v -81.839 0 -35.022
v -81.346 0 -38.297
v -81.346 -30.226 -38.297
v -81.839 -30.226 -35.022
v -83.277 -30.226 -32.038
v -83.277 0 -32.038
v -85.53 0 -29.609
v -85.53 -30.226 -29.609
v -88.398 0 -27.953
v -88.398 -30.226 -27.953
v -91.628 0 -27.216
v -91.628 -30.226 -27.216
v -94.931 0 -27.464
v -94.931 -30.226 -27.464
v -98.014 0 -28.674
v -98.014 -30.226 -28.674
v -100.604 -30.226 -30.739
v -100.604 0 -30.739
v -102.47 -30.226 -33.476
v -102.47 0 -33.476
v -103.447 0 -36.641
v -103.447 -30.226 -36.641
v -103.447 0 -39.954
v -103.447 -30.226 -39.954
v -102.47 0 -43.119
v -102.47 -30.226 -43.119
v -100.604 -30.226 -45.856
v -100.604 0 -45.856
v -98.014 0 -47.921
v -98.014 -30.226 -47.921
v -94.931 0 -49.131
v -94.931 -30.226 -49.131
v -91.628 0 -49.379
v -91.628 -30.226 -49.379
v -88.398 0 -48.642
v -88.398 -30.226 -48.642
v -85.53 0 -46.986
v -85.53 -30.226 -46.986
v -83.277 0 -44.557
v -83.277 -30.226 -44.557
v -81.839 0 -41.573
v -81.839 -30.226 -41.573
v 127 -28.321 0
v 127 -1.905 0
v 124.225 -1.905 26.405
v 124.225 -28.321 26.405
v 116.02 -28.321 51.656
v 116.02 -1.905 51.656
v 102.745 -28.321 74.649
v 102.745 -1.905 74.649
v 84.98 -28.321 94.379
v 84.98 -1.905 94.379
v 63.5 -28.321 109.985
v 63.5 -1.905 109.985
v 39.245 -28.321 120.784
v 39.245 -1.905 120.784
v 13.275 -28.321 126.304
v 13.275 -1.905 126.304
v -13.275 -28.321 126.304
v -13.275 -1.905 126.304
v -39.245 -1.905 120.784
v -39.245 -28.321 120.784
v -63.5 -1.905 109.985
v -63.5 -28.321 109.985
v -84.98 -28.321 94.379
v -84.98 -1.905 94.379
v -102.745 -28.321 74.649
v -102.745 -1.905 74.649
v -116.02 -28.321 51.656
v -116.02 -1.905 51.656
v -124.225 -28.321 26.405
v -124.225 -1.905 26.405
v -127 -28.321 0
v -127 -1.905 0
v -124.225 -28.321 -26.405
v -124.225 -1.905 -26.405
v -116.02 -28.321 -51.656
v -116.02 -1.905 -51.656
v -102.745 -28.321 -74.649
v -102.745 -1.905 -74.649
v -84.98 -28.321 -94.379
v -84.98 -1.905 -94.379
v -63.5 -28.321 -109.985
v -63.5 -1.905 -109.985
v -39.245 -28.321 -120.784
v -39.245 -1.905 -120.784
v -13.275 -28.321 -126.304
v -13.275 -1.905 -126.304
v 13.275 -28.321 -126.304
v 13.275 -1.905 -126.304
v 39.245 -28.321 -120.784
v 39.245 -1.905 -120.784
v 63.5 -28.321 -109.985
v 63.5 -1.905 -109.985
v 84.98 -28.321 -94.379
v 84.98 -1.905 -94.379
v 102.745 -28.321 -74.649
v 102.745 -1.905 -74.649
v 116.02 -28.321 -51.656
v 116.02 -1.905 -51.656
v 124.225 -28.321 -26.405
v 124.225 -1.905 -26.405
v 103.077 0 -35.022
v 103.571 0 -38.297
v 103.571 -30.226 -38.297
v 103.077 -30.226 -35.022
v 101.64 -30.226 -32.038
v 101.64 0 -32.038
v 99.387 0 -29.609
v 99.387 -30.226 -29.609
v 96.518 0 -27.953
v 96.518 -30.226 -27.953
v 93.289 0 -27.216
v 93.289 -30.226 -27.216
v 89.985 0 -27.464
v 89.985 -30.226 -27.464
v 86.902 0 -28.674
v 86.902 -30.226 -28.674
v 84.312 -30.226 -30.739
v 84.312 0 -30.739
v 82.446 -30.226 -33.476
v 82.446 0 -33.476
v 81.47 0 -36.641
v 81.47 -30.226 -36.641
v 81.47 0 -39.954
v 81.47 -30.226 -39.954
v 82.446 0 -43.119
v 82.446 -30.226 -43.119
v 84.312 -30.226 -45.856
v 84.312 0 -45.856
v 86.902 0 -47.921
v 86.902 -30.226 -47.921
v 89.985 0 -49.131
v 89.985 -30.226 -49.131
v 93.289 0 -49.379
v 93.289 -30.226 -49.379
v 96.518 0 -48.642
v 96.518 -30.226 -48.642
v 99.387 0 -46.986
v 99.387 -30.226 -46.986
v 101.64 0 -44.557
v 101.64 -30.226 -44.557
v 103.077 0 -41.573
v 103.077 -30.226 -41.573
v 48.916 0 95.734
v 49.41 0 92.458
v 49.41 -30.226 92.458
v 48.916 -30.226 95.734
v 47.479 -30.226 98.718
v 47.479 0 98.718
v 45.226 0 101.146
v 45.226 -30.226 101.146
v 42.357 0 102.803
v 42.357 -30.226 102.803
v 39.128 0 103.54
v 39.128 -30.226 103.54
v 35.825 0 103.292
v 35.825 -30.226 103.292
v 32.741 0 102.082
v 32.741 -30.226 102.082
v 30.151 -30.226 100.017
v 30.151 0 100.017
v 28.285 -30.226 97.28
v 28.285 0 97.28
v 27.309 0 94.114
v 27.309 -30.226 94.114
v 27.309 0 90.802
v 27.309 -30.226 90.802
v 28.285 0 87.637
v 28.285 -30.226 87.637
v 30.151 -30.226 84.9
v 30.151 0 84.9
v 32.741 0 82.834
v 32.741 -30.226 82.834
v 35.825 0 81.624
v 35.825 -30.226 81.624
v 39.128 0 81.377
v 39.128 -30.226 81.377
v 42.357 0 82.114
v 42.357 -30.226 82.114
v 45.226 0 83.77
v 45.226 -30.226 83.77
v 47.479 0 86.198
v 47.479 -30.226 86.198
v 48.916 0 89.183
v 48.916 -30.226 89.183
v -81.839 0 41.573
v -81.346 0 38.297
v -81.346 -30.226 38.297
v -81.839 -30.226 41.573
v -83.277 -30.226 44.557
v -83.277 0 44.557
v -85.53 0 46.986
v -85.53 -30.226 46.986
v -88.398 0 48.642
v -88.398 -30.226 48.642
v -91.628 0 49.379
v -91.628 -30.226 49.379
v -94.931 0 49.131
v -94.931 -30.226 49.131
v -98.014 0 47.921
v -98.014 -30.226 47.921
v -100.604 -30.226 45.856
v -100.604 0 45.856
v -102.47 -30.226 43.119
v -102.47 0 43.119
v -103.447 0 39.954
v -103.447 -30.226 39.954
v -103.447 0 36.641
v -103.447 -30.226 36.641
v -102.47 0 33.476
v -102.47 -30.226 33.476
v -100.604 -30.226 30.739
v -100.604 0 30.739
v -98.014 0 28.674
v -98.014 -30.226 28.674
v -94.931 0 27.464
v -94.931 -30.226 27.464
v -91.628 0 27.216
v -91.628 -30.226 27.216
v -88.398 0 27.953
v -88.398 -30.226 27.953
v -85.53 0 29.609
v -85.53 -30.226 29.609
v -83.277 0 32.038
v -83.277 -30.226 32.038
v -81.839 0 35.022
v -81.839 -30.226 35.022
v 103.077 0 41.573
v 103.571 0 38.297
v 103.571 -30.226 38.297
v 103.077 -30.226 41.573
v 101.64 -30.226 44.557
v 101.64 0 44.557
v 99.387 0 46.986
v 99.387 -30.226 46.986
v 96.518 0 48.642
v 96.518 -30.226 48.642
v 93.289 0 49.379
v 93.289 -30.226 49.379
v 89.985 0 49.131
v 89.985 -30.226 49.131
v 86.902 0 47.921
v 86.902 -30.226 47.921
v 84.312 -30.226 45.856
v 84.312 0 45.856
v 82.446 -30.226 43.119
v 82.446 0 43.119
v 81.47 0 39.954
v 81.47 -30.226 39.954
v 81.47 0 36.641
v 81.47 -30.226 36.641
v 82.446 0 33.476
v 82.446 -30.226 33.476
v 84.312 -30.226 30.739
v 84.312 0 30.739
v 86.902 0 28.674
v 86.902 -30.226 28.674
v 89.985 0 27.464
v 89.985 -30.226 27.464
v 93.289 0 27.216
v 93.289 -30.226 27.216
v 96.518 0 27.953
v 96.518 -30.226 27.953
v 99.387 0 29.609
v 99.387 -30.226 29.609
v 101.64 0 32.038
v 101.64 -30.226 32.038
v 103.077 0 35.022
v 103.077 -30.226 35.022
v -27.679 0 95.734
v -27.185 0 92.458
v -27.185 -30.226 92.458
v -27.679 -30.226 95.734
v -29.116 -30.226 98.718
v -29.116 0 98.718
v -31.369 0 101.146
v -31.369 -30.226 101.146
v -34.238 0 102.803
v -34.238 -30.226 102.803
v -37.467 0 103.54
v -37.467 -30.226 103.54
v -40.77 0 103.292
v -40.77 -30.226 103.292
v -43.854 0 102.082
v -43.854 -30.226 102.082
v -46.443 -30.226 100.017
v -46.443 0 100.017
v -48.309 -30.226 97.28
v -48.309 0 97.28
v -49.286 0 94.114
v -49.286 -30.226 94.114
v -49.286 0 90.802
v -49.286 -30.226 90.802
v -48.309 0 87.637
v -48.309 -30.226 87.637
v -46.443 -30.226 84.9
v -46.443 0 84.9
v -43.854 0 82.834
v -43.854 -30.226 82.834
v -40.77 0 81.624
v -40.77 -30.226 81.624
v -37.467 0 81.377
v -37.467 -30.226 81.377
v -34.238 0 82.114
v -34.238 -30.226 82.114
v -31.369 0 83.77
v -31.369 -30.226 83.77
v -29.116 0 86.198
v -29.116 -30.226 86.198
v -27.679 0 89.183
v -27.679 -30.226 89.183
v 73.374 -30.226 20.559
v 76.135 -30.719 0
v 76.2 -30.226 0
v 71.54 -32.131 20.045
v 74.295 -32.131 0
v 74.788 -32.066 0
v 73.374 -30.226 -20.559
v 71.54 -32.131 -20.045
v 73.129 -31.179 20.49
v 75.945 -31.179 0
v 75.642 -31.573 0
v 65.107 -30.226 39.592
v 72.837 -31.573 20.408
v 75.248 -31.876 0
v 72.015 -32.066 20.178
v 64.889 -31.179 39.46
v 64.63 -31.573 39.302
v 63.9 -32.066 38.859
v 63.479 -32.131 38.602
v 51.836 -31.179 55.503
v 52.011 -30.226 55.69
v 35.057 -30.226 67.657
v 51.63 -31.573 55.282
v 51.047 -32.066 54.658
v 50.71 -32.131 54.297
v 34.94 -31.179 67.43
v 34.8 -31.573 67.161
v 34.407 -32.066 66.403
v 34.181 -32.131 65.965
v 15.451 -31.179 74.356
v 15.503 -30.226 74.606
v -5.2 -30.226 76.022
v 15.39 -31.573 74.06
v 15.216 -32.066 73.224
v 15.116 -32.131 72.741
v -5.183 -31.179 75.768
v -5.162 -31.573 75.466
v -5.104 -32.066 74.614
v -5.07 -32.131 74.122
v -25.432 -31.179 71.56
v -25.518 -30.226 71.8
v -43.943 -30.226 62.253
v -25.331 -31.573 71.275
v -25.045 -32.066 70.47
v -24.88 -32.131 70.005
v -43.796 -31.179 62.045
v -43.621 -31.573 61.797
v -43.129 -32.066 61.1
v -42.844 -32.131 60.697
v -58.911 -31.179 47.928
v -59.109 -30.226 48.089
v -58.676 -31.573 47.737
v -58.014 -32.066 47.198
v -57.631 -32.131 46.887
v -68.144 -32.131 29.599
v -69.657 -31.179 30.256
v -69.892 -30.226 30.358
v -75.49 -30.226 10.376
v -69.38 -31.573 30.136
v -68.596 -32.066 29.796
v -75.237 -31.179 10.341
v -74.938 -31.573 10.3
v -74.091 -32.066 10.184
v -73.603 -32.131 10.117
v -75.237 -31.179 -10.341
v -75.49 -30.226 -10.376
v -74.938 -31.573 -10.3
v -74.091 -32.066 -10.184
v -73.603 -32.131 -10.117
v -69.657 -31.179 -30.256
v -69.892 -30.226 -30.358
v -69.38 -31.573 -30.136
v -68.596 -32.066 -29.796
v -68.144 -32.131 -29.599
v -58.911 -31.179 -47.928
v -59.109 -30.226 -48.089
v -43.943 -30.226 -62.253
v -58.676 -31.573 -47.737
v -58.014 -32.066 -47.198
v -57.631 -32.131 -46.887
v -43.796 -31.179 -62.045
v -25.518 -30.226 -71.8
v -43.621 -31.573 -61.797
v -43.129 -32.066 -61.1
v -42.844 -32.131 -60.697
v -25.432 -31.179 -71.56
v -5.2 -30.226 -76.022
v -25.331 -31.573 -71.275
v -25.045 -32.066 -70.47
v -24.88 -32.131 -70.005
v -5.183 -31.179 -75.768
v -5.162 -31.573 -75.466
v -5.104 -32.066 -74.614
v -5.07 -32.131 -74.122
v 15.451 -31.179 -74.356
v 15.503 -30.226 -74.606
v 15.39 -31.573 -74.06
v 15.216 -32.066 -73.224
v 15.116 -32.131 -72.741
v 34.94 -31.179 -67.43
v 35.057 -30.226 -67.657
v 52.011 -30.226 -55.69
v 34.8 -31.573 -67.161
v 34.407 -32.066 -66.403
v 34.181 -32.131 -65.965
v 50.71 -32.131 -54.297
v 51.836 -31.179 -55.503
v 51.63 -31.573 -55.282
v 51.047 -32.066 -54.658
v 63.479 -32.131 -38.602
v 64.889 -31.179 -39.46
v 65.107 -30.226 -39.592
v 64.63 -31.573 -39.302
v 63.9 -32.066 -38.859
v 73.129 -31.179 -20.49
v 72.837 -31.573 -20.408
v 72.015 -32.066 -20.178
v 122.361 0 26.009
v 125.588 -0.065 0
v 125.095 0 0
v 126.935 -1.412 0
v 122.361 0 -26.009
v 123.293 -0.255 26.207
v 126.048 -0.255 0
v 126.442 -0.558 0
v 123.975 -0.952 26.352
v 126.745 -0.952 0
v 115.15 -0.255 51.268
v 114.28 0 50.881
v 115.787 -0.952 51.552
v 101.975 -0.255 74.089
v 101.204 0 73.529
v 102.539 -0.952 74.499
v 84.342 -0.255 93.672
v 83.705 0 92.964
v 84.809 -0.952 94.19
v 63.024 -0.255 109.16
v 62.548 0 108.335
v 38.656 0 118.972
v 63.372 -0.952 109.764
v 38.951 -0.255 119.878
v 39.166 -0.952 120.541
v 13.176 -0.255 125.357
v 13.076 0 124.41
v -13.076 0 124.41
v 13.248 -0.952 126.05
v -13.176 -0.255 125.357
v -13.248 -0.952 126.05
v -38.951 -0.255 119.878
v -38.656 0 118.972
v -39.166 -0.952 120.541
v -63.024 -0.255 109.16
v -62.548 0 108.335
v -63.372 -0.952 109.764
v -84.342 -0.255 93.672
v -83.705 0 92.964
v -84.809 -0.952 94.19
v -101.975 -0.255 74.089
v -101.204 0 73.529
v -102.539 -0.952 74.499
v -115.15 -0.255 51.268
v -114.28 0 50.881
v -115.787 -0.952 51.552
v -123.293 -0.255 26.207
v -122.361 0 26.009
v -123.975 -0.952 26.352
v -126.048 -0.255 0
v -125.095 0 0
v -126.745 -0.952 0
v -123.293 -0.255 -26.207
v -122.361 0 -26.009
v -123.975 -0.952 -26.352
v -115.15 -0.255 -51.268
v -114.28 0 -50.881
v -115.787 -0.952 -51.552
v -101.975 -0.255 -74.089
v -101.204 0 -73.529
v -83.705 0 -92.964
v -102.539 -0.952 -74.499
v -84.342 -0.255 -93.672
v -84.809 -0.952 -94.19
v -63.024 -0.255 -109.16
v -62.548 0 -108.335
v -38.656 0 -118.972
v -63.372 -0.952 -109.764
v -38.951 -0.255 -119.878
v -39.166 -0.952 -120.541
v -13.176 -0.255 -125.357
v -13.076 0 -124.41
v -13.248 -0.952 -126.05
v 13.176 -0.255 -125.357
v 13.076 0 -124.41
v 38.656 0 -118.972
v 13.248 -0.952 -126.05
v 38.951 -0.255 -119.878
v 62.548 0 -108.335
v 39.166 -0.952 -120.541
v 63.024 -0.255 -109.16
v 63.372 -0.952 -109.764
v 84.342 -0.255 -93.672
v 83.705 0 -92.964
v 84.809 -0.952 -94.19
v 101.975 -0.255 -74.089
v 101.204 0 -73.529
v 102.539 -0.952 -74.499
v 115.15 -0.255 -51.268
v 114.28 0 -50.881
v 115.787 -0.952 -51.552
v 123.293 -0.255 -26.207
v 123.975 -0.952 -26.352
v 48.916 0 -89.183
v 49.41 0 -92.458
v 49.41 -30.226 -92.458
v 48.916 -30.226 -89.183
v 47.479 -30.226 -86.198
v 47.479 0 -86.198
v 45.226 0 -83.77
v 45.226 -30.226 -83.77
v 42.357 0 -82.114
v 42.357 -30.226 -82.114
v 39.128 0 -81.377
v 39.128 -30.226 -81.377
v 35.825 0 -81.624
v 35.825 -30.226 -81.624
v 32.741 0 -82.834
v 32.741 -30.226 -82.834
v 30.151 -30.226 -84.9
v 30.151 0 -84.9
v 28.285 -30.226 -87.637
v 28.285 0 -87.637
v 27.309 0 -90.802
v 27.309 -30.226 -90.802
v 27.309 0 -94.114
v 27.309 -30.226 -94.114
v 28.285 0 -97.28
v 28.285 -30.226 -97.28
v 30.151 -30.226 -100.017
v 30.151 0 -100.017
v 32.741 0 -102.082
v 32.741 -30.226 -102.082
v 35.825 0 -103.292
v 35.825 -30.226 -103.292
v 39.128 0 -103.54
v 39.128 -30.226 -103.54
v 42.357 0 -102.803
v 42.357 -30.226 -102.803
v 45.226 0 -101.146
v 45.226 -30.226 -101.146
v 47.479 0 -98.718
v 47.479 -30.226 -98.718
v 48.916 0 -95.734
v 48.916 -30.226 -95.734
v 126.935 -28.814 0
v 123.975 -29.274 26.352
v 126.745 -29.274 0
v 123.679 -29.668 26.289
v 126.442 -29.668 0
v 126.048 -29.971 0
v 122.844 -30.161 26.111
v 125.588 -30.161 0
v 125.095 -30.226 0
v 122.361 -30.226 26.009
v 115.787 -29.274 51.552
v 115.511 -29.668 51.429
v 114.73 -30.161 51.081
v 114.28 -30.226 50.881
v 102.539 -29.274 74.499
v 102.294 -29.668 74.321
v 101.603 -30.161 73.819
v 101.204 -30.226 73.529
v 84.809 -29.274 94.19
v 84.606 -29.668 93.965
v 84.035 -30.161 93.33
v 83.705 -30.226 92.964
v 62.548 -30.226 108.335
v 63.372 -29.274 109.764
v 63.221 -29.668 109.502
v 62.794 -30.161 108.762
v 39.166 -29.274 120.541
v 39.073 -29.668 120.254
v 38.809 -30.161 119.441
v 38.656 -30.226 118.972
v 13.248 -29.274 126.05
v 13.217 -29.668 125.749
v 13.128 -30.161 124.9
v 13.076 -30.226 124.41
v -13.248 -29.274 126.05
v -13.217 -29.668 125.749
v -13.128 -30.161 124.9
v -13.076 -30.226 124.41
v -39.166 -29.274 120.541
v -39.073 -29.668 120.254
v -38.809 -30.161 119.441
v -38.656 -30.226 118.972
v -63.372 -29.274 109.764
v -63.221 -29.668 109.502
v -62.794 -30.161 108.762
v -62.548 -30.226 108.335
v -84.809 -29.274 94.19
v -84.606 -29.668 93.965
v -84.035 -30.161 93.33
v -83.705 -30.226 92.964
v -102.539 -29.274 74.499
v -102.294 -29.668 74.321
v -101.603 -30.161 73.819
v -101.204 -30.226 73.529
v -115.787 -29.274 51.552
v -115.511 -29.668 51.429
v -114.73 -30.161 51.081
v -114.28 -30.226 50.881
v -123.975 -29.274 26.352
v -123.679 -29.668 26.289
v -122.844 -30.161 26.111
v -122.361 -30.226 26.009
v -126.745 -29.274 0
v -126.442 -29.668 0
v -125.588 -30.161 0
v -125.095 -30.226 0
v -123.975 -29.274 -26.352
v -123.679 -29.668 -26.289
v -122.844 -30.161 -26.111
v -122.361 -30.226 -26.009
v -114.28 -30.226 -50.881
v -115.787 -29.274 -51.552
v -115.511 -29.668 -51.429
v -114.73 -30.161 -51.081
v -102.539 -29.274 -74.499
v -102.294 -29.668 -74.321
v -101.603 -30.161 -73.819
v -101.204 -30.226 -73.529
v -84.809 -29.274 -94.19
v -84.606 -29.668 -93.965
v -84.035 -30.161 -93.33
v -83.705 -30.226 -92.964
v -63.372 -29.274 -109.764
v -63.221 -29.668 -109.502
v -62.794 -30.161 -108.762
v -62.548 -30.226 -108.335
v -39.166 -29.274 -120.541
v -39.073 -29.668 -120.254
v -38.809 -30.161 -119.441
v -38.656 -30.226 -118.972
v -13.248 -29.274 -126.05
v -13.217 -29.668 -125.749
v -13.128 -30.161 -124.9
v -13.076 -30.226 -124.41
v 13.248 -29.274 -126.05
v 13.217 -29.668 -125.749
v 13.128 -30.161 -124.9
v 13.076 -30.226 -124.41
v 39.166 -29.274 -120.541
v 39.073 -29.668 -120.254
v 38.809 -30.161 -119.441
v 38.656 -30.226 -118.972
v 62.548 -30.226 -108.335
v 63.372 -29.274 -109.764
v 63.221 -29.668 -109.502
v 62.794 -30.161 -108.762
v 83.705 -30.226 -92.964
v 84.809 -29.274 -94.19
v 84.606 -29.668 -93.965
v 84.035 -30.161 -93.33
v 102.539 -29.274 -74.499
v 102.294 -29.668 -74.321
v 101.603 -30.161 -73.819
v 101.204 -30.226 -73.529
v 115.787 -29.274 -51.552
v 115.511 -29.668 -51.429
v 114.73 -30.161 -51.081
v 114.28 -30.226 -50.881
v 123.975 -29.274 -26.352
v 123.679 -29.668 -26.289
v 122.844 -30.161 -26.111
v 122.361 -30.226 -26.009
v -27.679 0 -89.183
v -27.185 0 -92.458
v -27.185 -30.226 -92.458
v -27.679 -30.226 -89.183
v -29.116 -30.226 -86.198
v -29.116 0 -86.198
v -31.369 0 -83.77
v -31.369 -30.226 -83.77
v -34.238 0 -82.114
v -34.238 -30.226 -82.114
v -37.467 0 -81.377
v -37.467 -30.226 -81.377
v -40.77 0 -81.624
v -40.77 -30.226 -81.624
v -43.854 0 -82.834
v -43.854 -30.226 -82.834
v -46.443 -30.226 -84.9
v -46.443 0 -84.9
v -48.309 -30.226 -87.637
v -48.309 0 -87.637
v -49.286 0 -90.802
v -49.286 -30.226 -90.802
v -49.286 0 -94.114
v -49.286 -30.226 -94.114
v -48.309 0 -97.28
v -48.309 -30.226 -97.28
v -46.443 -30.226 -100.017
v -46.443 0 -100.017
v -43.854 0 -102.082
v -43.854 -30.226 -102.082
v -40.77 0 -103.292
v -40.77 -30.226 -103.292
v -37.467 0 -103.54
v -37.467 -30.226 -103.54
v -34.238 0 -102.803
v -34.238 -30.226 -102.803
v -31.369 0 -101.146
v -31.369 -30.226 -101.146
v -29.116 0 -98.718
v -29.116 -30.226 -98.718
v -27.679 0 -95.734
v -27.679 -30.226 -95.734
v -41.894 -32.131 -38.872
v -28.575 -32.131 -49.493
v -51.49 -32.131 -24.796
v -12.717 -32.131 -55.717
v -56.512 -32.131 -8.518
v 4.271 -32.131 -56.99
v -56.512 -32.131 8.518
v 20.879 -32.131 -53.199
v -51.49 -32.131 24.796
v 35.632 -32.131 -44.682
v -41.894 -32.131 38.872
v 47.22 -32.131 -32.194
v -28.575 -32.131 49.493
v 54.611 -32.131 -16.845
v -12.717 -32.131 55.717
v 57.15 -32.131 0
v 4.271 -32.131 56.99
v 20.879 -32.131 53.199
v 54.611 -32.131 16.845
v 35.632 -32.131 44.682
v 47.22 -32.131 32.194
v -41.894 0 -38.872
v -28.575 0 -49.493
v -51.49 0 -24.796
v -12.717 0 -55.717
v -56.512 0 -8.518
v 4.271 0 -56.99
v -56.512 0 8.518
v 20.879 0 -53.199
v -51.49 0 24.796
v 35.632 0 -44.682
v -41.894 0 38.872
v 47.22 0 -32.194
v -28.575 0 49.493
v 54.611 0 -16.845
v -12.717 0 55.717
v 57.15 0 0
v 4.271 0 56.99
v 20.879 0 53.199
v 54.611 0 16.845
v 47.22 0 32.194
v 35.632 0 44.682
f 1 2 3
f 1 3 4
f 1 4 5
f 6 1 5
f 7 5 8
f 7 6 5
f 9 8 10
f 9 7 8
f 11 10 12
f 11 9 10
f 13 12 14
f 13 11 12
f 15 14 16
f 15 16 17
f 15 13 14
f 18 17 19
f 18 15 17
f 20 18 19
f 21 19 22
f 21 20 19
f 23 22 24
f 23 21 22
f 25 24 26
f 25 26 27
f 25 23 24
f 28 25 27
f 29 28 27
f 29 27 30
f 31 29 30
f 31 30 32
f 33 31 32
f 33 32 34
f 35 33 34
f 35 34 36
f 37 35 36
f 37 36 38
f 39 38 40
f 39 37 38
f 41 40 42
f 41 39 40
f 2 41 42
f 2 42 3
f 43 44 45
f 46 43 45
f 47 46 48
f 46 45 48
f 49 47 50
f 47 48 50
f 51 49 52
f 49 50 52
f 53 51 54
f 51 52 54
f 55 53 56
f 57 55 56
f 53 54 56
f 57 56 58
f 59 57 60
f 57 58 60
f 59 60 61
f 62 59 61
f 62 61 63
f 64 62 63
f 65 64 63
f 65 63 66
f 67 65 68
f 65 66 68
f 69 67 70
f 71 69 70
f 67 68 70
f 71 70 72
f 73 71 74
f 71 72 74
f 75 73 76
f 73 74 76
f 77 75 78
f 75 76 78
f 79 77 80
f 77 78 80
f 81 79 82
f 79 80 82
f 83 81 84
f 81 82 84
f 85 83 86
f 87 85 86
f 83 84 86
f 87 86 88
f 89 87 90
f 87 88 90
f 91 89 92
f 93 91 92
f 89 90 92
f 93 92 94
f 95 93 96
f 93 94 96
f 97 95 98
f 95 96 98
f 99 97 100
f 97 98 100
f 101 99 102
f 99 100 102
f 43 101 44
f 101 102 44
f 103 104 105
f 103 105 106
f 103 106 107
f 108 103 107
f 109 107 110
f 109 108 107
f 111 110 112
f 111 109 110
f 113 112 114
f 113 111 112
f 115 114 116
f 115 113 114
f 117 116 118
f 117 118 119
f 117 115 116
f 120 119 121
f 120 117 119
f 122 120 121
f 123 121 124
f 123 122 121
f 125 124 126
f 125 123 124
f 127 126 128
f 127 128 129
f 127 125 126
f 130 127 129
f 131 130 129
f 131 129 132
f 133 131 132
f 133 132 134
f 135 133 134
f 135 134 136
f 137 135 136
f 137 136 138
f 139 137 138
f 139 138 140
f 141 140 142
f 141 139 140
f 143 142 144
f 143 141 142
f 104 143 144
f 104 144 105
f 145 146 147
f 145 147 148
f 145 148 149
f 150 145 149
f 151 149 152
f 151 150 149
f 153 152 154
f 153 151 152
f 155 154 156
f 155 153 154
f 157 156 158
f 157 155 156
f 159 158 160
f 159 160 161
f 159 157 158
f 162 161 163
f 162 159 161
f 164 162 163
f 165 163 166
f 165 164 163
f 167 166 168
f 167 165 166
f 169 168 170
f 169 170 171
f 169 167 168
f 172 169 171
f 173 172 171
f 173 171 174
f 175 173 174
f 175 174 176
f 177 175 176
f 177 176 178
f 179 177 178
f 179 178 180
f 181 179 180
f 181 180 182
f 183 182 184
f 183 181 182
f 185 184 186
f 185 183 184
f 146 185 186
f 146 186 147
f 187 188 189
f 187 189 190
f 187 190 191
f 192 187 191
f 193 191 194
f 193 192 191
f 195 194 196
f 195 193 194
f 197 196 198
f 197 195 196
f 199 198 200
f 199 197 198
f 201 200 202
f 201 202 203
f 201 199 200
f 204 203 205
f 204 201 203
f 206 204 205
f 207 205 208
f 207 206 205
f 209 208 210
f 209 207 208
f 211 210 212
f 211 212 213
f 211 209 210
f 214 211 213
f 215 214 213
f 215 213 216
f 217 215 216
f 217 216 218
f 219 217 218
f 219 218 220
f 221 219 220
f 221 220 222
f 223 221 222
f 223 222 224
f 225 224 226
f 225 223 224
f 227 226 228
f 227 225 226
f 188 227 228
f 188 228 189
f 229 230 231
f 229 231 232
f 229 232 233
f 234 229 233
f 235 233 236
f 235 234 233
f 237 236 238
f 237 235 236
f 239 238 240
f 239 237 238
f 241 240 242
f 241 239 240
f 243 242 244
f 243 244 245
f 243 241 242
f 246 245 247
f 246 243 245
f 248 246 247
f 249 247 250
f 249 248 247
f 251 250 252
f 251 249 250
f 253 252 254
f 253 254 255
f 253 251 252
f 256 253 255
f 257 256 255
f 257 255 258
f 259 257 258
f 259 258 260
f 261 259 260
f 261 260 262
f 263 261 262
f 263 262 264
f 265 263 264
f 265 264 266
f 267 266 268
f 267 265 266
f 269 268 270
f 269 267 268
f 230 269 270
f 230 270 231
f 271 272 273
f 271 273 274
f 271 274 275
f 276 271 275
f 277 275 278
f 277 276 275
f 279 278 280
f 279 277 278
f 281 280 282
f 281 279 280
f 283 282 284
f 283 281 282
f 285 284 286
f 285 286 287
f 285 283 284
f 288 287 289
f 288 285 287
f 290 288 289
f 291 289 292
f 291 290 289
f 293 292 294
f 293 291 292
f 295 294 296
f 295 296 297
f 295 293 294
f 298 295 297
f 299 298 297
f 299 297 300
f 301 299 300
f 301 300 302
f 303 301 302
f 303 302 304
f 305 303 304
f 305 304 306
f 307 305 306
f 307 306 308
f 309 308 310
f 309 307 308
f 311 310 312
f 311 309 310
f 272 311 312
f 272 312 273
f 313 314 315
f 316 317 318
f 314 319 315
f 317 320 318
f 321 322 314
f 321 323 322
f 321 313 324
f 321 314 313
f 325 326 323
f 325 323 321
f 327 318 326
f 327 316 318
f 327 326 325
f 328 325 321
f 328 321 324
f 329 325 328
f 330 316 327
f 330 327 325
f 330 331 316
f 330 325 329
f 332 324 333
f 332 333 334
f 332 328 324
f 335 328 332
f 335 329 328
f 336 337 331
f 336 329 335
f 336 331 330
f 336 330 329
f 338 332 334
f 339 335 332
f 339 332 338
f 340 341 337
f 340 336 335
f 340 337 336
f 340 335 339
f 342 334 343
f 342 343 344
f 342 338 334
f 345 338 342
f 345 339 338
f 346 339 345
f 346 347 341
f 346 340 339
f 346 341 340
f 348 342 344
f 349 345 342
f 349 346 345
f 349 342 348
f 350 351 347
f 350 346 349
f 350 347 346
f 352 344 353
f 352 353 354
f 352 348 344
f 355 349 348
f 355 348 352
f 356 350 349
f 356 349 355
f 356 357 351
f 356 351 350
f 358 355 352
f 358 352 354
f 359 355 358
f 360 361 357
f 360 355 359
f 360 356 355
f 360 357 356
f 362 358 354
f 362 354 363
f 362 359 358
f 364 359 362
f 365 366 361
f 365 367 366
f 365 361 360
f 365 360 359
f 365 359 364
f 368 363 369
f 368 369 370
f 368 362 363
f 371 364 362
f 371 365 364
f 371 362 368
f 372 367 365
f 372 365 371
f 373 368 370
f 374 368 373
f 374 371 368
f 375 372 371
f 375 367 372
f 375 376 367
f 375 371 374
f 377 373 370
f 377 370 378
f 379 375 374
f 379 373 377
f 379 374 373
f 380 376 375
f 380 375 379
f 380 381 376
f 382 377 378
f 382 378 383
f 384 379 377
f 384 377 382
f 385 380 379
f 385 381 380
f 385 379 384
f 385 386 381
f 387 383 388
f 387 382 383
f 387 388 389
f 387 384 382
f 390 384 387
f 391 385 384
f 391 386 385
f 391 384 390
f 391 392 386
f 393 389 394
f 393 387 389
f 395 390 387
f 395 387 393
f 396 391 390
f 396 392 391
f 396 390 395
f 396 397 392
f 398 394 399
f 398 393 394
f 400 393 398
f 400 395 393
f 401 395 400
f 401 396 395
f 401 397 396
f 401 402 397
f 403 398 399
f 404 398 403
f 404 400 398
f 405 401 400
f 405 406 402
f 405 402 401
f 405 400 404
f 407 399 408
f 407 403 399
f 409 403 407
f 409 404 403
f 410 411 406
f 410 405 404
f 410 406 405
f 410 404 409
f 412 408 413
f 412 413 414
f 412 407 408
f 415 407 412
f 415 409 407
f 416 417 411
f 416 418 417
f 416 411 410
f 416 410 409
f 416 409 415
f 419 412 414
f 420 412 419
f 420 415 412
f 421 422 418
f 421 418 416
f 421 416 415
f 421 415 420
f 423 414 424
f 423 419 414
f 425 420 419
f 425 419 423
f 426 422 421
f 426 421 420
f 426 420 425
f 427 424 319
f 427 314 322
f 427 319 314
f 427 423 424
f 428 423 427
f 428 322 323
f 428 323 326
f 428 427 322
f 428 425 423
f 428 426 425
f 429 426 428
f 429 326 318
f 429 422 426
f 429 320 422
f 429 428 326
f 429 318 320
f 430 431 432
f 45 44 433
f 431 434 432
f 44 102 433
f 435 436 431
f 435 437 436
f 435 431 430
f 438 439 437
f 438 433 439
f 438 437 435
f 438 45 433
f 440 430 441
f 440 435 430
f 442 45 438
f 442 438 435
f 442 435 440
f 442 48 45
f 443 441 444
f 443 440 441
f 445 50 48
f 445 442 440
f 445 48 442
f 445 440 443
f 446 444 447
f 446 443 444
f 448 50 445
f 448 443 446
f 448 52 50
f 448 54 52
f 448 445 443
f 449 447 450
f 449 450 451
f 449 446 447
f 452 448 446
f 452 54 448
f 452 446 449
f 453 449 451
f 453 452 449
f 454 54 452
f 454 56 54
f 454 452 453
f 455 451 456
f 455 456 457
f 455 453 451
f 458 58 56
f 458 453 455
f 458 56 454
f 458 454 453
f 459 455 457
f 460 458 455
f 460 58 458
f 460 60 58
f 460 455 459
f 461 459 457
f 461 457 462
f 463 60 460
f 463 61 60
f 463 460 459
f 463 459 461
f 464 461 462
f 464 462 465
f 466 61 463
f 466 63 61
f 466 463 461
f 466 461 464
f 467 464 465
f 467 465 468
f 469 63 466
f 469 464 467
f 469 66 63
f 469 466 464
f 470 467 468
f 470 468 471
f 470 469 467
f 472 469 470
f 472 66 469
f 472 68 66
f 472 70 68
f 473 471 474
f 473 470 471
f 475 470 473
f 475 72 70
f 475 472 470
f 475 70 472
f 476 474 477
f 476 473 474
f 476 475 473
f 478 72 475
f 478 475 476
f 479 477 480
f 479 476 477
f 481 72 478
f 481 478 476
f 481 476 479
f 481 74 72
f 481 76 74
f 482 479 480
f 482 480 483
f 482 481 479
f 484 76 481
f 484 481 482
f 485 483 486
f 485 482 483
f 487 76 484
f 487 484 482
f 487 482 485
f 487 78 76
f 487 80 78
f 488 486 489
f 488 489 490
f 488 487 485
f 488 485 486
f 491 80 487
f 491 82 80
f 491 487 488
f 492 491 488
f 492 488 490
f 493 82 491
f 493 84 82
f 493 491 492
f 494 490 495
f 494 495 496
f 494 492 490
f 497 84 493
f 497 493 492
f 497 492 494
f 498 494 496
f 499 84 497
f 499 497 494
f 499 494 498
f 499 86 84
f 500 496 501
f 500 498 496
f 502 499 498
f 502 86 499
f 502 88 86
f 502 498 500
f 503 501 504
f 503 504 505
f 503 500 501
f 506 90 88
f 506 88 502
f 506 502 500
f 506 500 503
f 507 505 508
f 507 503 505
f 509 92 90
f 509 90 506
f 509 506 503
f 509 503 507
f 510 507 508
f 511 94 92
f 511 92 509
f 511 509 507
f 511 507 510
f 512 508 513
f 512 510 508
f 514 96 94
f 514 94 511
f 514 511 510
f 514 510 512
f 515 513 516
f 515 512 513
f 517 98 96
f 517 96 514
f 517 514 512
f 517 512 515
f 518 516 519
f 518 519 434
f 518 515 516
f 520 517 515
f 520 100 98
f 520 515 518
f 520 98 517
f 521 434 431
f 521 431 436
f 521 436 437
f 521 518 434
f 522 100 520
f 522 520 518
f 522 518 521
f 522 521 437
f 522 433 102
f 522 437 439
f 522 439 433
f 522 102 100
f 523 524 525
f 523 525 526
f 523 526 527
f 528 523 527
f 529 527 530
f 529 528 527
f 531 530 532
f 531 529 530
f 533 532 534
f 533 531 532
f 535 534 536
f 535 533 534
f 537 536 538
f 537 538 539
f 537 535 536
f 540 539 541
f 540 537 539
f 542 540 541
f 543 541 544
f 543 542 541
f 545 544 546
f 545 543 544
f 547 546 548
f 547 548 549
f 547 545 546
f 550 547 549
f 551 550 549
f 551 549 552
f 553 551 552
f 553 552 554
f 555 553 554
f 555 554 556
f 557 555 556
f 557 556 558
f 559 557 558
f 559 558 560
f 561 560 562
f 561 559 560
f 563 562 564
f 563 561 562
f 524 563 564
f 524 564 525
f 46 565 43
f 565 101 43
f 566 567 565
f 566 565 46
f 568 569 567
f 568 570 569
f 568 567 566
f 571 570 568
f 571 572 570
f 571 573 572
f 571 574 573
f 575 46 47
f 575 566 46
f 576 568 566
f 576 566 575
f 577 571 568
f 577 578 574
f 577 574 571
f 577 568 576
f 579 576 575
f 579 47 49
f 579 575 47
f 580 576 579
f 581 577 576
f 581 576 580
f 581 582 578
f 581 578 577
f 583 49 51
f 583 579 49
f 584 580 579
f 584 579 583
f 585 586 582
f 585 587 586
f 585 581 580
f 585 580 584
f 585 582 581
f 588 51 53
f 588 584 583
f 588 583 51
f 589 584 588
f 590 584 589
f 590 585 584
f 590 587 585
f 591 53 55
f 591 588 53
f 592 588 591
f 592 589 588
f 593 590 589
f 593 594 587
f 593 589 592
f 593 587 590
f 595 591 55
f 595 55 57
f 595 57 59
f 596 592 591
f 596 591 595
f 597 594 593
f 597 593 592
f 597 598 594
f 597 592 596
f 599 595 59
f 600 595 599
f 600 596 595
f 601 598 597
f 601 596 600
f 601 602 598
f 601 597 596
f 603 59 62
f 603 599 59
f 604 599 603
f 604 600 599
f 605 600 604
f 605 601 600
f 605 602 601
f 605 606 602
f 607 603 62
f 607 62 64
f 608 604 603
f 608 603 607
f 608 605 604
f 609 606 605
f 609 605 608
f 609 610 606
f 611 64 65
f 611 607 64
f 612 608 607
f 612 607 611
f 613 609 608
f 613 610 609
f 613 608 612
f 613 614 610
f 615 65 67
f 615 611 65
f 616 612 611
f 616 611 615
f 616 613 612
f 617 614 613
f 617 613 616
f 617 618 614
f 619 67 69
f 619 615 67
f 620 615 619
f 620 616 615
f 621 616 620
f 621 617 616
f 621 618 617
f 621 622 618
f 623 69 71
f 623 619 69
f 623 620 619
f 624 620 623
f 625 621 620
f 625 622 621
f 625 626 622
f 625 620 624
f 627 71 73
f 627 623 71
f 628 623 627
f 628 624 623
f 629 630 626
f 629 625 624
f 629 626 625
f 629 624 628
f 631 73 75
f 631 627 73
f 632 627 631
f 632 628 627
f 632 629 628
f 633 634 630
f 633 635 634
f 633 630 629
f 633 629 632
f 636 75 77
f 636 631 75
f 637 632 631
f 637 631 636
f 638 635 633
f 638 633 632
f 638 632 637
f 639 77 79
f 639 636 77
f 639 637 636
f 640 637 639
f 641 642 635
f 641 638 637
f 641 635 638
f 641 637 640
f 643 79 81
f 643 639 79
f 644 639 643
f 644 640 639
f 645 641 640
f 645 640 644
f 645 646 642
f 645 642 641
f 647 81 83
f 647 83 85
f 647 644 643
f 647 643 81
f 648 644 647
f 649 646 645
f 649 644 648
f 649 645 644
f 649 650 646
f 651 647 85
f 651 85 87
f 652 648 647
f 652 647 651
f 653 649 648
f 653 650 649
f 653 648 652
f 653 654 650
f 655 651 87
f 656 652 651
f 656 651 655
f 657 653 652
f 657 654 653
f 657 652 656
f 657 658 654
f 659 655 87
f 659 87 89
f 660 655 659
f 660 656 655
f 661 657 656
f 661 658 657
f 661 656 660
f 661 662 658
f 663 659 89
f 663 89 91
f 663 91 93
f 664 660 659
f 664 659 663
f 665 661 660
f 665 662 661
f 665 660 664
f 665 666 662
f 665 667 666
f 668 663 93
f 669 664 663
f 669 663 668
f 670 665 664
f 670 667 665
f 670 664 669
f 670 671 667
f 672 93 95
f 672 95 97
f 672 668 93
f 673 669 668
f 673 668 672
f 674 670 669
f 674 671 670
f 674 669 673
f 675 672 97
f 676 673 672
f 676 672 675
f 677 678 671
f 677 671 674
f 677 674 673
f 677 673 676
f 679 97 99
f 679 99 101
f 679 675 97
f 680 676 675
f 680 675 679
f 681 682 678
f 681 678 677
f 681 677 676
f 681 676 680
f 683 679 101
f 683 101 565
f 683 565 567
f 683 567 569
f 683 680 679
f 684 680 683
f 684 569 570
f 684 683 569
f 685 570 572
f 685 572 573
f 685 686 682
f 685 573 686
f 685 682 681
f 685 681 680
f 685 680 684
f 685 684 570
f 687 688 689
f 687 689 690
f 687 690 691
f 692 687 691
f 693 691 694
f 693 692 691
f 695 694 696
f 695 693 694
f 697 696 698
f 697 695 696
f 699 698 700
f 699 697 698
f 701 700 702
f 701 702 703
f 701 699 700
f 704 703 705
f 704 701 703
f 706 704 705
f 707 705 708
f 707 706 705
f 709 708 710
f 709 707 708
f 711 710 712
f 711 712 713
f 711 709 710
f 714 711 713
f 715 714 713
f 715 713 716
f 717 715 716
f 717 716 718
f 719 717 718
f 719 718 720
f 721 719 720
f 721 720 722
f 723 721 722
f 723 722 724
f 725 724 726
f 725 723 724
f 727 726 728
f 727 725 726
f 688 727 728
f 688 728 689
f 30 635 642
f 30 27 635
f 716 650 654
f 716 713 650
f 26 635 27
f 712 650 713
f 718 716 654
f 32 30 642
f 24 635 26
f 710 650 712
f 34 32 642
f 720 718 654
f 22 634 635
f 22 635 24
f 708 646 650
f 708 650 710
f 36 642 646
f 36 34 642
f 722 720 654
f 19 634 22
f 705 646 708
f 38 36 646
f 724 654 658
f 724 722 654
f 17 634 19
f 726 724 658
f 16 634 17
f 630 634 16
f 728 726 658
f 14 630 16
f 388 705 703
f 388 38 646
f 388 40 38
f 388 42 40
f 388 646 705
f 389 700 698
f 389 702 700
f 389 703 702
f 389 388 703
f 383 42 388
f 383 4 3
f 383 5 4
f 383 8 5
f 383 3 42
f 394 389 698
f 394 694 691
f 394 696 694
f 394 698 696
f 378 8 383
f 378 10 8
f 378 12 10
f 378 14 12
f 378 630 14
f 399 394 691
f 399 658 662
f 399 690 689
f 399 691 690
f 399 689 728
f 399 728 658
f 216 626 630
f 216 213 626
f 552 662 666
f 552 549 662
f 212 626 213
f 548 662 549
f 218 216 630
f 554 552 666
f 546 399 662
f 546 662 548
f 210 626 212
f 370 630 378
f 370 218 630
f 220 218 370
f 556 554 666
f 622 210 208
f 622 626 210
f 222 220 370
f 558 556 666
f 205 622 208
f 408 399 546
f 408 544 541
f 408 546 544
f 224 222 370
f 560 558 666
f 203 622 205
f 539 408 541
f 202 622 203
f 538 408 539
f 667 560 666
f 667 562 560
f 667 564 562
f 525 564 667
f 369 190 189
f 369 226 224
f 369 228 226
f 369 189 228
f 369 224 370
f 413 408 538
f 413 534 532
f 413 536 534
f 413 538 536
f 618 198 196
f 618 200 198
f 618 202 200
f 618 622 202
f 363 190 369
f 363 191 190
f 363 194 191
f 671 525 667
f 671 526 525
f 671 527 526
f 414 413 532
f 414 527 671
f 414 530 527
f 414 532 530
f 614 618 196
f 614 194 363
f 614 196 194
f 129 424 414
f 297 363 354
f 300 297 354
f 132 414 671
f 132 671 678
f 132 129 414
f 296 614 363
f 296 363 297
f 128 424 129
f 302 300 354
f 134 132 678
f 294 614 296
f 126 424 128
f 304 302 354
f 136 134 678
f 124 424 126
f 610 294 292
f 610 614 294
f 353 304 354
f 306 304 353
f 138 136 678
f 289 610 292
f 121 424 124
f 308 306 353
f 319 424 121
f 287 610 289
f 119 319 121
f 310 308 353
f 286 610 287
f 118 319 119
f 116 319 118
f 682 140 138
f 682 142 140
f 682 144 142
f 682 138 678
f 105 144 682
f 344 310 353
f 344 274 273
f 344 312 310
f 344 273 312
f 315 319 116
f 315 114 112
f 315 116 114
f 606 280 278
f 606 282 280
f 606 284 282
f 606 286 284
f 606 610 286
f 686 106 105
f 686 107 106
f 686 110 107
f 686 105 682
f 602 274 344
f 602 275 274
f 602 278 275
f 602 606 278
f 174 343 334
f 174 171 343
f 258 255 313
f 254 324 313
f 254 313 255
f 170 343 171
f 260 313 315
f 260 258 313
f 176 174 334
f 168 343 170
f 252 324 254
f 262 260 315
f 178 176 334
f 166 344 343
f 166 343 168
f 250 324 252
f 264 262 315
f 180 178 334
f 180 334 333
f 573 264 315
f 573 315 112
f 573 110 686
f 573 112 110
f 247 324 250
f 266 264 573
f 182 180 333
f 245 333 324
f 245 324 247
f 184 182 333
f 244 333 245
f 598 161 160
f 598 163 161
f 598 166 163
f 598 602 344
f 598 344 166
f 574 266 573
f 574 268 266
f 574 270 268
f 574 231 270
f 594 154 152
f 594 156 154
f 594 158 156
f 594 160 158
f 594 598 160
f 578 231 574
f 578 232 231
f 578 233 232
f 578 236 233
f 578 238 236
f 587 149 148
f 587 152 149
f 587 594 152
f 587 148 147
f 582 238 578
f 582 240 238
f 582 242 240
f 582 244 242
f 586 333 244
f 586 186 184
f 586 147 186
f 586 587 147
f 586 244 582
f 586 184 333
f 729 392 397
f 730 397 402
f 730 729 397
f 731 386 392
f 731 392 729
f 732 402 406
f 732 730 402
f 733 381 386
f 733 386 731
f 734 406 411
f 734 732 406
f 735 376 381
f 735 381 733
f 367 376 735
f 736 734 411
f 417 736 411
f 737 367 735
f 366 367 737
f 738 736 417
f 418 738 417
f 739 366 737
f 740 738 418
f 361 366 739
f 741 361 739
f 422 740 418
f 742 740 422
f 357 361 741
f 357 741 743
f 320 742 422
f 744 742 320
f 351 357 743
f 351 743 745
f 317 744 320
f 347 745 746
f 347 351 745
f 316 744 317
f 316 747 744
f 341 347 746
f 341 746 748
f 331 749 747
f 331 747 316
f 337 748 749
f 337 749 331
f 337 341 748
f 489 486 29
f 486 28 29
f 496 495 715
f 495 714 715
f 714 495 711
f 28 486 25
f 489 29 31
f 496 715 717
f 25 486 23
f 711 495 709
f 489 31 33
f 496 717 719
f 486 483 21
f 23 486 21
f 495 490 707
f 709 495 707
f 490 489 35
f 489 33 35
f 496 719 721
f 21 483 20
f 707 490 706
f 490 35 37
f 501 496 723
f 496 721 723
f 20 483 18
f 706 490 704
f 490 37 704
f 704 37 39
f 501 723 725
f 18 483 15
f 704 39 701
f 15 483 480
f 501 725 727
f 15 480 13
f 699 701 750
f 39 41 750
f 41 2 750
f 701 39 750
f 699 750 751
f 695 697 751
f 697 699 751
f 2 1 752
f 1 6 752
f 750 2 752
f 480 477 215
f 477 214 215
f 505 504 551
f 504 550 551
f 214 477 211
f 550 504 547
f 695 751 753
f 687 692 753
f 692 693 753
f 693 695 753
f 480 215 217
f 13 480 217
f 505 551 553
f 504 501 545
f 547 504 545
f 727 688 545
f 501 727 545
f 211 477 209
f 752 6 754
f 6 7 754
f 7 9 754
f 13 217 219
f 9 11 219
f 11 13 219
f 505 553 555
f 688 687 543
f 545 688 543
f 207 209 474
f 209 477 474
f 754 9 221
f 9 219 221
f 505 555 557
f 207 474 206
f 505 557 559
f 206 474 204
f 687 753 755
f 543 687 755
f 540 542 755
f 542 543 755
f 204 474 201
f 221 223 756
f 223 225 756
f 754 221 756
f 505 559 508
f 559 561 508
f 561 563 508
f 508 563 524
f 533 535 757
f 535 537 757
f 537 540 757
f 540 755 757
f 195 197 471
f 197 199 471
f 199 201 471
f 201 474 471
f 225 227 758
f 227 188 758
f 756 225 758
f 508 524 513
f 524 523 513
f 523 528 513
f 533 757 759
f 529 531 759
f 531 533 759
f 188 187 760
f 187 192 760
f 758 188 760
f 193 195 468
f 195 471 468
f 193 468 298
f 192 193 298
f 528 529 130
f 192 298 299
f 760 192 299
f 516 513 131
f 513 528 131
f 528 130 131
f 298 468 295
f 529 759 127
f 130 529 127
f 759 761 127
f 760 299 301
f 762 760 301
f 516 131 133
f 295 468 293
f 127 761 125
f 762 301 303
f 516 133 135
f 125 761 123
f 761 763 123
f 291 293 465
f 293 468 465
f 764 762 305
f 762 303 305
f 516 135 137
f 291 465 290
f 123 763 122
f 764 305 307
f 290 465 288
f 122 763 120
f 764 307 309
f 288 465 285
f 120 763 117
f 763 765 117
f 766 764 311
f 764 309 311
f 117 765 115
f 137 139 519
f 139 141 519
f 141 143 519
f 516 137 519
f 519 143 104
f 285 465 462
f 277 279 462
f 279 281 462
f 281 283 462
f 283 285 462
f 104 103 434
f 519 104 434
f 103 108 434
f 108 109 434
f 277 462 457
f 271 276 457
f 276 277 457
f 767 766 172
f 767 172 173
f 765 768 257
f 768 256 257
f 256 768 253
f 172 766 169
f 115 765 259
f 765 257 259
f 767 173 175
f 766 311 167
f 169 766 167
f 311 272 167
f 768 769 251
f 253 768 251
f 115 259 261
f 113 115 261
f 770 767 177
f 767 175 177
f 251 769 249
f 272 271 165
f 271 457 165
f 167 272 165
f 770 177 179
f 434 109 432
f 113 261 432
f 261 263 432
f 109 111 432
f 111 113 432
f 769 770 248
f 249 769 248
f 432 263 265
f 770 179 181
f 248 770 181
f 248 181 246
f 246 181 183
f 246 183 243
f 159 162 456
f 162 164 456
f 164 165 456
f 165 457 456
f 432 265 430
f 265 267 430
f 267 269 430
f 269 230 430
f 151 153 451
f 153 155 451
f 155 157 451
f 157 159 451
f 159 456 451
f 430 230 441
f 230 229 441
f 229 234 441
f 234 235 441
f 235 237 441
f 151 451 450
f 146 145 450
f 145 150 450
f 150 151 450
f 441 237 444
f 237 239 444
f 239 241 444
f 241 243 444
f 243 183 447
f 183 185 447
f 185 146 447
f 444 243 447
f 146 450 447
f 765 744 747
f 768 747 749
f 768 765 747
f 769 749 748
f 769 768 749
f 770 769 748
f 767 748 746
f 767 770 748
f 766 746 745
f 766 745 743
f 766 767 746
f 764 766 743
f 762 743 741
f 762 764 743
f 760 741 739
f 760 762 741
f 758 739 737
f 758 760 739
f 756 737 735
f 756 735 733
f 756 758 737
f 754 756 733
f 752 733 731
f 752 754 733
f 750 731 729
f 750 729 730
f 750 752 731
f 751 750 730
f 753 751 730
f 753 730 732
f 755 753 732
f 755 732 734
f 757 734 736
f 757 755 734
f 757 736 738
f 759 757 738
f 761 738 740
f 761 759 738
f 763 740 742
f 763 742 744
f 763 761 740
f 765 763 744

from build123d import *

# Parameters (mm, degrees)
F0_R     = 127
F0_R_2   = 11.1125
F0_R_3   = 57.15
F1_DEPTH = 30.226
F2_R     = 76.2
F2_R_2   = 57.15
F3_DEPTH = 1.905
F4_R     = 1.90499


# Not quite as in the source:
# - a fillet or chamfer is up to 0.001 mm smaller than in the source, because OpenCascade refuses the exact size


with BuildPart() as f1:
    # F0 (on Front) → F1 (new body)
    with BuildSketch(Plane.XZ):
        Circle(F0_R)
        with Locations((-38.2974271774, -92.4581680956)):
            Circle(F0_R_2, mode=Mode.SUBTRACT)
        with Locations((-92.4581680956, -38.2974271774)):
            Circle(F0_R_2, mode=Mode.SUBTRACT)
        with Locations((38.2974271774, -92.4581680956)):
            Circle(F0_R_2, mode=Mode.SUBTRACT)
        with Locations((92.4581680956, -38.2974271774)):
            Circle(F0_R_2, mode=Mode.SUBTRACT)
        with Locations((-92.4581680956, 38.2974271774)):
            Circle(F0_R_2, mode=Mode.SUBTRACT)
        with Locations((-38.2974271774, 92.4581680956)):
            Circle(F0_R_2, mode=Mode.SUBTRACT)
        Circle(F0_R_3, mode=Mode.SUBTRACT)
        with Locations((92.4581680956, 38.2974271774)):
            Circle(F0_R_2, mode=Mode.SUBTRACT)
        with Locations((38.2974271774, 92.4581680956)):
            Circle(F0_R_2, mode=Mode.SUBTRACT)
    extrude(amount=F1_DEPTH)

    # F2 (on face) → F3 (join)
    with BuildSketch(Plane.XZ.offset(30.226)):
        Circle(F2_R)
        Circle(F2_R_2, mode=Mode.SUBTRACT)
    extrude(amount=F3_DEPTH)

    # F4 (radius 1.905 in the source; OpenCascade refuses exactly that, so slightly less here)
    f4_edges = [f1.edges().sort_by_distance(p)[0] for p in [
        (-127, 0, 0),
        (-127, -30.226, 0),
        (-76.2, -32.131, 0),
    ]]
    fillet(f4_edges, radius=F4_R)


solid = f1.part
